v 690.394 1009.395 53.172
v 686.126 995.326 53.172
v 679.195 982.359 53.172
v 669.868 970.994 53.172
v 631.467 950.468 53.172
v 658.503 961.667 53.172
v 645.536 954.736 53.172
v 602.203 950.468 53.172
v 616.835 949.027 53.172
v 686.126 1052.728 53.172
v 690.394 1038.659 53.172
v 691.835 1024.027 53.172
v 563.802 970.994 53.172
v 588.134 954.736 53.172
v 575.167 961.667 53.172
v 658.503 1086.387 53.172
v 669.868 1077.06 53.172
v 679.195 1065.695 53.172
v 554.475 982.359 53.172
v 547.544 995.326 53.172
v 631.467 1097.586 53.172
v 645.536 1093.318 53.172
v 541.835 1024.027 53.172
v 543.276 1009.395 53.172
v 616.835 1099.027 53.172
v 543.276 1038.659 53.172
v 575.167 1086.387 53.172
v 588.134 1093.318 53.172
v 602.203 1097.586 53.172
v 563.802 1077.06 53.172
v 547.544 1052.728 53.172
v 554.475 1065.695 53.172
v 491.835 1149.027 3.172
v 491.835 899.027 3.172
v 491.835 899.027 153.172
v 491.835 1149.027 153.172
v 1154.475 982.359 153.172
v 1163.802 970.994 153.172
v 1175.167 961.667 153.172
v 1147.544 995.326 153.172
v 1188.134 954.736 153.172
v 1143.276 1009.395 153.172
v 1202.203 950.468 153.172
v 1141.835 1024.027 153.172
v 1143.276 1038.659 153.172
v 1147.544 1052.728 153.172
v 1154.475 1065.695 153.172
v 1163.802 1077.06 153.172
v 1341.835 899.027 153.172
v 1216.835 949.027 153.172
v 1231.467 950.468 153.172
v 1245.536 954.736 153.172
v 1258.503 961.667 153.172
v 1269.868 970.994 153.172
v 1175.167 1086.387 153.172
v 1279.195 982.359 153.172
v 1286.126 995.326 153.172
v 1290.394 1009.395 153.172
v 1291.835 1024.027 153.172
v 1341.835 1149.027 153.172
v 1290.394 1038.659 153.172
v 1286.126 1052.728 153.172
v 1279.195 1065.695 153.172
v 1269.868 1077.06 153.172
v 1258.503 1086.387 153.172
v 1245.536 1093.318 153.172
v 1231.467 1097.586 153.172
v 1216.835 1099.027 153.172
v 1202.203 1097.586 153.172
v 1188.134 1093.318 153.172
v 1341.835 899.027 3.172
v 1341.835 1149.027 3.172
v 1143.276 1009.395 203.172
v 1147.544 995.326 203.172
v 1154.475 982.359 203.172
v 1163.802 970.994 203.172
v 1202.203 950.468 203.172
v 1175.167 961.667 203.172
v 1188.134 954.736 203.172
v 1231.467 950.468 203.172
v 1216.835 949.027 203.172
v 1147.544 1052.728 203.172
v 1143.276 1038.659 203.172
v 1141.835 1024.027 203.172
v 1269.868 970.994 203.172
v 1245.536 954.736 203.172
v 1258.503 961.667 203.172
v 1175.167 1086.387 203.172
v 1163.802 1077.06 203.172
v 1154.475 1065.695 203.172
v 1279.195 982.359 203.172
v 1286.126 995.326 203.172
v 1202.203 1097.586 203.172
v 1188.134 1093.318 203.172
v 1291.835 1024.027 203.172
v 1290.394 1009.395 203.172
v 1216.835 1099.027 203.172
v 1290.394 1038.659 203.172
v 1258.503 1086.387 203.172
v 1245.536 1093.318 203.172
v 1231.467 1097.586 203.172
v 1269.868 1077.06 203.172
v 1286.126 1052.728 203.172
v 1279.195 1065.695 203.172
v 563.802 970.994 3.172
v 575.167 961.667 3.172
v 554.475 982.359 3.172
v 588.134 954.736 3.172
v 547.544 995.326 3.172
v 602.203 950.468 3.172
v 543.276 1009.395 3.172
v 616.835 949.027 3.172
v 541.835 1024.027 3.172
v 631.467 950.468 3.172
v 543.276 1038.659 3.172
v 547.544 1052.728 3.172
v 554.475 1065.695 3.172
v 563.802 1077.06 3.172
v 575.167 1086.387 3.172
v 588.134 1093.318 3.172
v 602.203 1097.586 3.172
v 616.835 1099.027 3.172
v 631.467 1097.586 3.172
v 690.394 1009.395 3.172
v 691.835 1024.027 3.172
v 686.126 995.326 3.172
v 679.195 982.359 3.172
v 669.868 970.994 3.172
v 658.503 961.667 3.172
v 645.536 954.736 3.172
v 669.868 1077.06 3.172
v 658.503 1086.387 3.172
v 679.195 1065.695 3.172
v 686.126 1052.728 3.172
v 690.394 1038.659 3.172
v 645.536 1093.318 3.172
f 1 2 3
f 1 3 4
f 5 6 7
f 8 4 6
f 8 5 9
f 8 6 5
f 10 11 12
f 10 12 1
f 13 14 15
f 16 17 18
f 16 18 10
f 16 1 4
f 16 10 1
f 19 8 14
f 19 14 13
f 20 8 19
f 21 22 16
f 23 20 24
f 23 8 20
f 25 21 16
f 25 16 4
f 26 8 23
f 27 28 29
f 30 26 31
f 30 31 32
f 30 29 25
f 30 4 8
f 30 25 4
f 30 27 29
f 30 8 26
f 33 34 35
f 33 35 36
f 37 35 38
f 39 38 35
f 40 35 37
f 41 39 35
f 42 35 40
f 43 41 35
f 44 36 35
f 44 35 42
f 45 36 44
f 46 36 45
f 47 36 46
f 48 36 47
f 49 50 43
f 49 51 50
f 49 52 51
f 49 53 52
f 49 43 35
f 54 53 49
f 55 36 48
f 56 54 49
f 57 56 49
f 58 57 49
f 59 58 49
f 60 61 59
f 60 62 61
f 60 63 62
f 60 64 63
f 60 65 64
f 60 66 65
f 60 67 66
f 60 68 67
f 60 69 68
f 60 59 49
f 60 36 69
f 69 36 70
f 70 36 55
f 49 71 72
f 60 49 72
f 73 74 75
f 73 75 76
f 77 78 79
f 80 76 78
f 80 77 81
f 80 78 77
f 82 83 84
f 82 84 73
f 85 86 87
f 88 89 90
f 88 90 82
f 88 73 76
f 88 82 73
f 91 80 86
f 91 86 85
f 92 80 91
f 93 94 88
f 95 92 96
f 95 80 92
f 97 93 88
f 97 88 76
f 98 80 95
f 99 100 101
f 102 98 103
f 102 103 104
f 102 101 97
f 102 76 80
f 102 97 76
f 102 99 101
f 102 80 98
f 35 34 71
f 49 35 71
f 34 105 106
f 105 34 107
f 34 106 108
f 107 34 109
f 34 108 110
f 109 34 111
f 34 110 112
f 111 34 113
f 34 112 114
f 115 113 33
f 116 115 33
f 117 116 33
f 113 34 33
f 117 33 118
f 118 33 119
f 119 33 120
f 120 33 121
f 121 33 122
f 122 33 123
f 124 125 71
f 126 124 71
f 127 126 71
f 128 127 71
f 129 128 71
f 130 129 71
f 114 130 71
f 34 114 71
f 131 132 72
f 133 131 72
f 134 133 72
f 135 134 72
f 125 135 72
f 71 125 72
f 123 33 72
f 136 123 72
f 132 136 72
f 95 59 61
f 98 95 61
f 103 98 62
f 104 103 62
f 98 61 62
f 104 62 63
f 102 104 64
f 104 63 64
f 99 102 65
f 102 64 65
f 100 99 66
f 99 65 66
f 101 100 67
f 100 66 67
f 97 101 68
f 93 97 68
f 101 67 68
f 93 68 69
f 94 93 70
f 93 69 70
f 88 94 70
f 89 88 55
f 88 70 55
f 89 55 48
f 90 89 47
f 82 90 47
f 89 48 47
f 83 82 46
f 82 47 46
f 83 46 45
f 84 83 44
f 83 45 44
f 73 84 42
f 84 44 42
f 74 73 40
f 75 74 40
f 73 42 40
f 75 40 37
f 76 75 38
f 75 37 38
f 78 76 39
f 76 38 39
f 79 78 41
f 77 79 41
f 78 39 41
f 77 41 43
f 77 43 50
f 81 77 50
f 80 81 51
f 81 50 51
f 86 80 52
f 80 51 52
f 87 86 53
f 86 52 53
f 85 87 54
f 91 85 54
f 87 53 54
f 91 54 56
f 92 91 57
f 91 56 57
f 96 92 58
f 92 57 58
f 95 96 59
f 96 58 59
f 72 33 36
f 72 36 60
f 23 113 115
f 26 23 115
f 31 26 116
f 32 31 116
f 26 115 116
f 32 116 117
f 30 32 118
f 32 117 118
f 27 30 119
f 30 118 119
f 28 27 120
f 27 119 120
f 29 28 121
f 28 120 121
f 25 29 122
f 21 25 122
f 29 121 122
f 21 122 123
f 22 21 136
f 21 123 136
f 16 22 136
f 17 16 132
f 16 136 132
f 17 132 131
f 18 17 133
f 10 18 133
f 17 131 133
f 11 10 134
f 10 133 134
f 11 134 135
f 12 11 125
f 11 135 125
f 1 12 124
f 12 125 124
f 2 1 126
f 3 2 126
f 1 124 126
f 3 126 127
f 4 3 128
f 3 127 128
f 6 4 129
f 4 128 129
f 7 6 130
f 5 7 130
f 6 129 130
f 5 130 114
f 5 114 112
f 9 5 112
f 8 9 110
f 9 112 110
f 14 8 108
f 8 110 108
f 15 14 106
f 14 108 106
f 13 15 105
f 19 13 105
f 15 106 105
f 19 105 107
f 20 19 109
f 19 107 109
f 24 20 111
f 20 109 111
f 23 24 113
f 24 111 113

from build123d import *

# Parameters (mm, degrees)
CROQUIS2_W              = 850
CROQUIS2_H              = 250
SALIENTE_EXTRUIR1_DEPTH = 150
CROQUIS3_R              = 75
CORTAR_EXTRUIR1_DEPTH   = 50
CROQUIS4_R              = 75
SALIENTE_EXTRUIR2_DEPTH = 50


with BuildPart() as part:
    # Croquis2 → Saliente-Extruir1 (new body)
    with BuildSketch(Plane.XY.offset(3.171613416)):
        with Locations((916.834843653, 1024.026997685)):
            Rectangle(CROQUIS2_W, CROQUIS2_H)
    extrude(amount=SALIENTE_EXTRUIR1_DEPTH)

    # Croquis3 → Cortar-Extruir1 (cut)
    with BuildSketch(Plane(origin=(0, 0, 3.171613416), x_dir=(-1, 0, 0), z_dir=(0, 0, -1))):
        with Locations((-616.834843653, 1024.026997685)):
            Circle(CROQUIS3_R)
    extrude(amount=-CORTAR_EXTRUIR1_DEPTH, mode=Mode.SUBTRACT)

    # Croquis4 → Saliente-Extruir2 (add)
    with BuildSketch(Plane.XY.offset(153.171613416)):
        with Locations((1216.834843653, 1024.026997685)):
            Circle(CROQUIS4_R)
    extrude(amount=SALIENTE_EXTRUIR2_DEPTH)


solid = part.part
